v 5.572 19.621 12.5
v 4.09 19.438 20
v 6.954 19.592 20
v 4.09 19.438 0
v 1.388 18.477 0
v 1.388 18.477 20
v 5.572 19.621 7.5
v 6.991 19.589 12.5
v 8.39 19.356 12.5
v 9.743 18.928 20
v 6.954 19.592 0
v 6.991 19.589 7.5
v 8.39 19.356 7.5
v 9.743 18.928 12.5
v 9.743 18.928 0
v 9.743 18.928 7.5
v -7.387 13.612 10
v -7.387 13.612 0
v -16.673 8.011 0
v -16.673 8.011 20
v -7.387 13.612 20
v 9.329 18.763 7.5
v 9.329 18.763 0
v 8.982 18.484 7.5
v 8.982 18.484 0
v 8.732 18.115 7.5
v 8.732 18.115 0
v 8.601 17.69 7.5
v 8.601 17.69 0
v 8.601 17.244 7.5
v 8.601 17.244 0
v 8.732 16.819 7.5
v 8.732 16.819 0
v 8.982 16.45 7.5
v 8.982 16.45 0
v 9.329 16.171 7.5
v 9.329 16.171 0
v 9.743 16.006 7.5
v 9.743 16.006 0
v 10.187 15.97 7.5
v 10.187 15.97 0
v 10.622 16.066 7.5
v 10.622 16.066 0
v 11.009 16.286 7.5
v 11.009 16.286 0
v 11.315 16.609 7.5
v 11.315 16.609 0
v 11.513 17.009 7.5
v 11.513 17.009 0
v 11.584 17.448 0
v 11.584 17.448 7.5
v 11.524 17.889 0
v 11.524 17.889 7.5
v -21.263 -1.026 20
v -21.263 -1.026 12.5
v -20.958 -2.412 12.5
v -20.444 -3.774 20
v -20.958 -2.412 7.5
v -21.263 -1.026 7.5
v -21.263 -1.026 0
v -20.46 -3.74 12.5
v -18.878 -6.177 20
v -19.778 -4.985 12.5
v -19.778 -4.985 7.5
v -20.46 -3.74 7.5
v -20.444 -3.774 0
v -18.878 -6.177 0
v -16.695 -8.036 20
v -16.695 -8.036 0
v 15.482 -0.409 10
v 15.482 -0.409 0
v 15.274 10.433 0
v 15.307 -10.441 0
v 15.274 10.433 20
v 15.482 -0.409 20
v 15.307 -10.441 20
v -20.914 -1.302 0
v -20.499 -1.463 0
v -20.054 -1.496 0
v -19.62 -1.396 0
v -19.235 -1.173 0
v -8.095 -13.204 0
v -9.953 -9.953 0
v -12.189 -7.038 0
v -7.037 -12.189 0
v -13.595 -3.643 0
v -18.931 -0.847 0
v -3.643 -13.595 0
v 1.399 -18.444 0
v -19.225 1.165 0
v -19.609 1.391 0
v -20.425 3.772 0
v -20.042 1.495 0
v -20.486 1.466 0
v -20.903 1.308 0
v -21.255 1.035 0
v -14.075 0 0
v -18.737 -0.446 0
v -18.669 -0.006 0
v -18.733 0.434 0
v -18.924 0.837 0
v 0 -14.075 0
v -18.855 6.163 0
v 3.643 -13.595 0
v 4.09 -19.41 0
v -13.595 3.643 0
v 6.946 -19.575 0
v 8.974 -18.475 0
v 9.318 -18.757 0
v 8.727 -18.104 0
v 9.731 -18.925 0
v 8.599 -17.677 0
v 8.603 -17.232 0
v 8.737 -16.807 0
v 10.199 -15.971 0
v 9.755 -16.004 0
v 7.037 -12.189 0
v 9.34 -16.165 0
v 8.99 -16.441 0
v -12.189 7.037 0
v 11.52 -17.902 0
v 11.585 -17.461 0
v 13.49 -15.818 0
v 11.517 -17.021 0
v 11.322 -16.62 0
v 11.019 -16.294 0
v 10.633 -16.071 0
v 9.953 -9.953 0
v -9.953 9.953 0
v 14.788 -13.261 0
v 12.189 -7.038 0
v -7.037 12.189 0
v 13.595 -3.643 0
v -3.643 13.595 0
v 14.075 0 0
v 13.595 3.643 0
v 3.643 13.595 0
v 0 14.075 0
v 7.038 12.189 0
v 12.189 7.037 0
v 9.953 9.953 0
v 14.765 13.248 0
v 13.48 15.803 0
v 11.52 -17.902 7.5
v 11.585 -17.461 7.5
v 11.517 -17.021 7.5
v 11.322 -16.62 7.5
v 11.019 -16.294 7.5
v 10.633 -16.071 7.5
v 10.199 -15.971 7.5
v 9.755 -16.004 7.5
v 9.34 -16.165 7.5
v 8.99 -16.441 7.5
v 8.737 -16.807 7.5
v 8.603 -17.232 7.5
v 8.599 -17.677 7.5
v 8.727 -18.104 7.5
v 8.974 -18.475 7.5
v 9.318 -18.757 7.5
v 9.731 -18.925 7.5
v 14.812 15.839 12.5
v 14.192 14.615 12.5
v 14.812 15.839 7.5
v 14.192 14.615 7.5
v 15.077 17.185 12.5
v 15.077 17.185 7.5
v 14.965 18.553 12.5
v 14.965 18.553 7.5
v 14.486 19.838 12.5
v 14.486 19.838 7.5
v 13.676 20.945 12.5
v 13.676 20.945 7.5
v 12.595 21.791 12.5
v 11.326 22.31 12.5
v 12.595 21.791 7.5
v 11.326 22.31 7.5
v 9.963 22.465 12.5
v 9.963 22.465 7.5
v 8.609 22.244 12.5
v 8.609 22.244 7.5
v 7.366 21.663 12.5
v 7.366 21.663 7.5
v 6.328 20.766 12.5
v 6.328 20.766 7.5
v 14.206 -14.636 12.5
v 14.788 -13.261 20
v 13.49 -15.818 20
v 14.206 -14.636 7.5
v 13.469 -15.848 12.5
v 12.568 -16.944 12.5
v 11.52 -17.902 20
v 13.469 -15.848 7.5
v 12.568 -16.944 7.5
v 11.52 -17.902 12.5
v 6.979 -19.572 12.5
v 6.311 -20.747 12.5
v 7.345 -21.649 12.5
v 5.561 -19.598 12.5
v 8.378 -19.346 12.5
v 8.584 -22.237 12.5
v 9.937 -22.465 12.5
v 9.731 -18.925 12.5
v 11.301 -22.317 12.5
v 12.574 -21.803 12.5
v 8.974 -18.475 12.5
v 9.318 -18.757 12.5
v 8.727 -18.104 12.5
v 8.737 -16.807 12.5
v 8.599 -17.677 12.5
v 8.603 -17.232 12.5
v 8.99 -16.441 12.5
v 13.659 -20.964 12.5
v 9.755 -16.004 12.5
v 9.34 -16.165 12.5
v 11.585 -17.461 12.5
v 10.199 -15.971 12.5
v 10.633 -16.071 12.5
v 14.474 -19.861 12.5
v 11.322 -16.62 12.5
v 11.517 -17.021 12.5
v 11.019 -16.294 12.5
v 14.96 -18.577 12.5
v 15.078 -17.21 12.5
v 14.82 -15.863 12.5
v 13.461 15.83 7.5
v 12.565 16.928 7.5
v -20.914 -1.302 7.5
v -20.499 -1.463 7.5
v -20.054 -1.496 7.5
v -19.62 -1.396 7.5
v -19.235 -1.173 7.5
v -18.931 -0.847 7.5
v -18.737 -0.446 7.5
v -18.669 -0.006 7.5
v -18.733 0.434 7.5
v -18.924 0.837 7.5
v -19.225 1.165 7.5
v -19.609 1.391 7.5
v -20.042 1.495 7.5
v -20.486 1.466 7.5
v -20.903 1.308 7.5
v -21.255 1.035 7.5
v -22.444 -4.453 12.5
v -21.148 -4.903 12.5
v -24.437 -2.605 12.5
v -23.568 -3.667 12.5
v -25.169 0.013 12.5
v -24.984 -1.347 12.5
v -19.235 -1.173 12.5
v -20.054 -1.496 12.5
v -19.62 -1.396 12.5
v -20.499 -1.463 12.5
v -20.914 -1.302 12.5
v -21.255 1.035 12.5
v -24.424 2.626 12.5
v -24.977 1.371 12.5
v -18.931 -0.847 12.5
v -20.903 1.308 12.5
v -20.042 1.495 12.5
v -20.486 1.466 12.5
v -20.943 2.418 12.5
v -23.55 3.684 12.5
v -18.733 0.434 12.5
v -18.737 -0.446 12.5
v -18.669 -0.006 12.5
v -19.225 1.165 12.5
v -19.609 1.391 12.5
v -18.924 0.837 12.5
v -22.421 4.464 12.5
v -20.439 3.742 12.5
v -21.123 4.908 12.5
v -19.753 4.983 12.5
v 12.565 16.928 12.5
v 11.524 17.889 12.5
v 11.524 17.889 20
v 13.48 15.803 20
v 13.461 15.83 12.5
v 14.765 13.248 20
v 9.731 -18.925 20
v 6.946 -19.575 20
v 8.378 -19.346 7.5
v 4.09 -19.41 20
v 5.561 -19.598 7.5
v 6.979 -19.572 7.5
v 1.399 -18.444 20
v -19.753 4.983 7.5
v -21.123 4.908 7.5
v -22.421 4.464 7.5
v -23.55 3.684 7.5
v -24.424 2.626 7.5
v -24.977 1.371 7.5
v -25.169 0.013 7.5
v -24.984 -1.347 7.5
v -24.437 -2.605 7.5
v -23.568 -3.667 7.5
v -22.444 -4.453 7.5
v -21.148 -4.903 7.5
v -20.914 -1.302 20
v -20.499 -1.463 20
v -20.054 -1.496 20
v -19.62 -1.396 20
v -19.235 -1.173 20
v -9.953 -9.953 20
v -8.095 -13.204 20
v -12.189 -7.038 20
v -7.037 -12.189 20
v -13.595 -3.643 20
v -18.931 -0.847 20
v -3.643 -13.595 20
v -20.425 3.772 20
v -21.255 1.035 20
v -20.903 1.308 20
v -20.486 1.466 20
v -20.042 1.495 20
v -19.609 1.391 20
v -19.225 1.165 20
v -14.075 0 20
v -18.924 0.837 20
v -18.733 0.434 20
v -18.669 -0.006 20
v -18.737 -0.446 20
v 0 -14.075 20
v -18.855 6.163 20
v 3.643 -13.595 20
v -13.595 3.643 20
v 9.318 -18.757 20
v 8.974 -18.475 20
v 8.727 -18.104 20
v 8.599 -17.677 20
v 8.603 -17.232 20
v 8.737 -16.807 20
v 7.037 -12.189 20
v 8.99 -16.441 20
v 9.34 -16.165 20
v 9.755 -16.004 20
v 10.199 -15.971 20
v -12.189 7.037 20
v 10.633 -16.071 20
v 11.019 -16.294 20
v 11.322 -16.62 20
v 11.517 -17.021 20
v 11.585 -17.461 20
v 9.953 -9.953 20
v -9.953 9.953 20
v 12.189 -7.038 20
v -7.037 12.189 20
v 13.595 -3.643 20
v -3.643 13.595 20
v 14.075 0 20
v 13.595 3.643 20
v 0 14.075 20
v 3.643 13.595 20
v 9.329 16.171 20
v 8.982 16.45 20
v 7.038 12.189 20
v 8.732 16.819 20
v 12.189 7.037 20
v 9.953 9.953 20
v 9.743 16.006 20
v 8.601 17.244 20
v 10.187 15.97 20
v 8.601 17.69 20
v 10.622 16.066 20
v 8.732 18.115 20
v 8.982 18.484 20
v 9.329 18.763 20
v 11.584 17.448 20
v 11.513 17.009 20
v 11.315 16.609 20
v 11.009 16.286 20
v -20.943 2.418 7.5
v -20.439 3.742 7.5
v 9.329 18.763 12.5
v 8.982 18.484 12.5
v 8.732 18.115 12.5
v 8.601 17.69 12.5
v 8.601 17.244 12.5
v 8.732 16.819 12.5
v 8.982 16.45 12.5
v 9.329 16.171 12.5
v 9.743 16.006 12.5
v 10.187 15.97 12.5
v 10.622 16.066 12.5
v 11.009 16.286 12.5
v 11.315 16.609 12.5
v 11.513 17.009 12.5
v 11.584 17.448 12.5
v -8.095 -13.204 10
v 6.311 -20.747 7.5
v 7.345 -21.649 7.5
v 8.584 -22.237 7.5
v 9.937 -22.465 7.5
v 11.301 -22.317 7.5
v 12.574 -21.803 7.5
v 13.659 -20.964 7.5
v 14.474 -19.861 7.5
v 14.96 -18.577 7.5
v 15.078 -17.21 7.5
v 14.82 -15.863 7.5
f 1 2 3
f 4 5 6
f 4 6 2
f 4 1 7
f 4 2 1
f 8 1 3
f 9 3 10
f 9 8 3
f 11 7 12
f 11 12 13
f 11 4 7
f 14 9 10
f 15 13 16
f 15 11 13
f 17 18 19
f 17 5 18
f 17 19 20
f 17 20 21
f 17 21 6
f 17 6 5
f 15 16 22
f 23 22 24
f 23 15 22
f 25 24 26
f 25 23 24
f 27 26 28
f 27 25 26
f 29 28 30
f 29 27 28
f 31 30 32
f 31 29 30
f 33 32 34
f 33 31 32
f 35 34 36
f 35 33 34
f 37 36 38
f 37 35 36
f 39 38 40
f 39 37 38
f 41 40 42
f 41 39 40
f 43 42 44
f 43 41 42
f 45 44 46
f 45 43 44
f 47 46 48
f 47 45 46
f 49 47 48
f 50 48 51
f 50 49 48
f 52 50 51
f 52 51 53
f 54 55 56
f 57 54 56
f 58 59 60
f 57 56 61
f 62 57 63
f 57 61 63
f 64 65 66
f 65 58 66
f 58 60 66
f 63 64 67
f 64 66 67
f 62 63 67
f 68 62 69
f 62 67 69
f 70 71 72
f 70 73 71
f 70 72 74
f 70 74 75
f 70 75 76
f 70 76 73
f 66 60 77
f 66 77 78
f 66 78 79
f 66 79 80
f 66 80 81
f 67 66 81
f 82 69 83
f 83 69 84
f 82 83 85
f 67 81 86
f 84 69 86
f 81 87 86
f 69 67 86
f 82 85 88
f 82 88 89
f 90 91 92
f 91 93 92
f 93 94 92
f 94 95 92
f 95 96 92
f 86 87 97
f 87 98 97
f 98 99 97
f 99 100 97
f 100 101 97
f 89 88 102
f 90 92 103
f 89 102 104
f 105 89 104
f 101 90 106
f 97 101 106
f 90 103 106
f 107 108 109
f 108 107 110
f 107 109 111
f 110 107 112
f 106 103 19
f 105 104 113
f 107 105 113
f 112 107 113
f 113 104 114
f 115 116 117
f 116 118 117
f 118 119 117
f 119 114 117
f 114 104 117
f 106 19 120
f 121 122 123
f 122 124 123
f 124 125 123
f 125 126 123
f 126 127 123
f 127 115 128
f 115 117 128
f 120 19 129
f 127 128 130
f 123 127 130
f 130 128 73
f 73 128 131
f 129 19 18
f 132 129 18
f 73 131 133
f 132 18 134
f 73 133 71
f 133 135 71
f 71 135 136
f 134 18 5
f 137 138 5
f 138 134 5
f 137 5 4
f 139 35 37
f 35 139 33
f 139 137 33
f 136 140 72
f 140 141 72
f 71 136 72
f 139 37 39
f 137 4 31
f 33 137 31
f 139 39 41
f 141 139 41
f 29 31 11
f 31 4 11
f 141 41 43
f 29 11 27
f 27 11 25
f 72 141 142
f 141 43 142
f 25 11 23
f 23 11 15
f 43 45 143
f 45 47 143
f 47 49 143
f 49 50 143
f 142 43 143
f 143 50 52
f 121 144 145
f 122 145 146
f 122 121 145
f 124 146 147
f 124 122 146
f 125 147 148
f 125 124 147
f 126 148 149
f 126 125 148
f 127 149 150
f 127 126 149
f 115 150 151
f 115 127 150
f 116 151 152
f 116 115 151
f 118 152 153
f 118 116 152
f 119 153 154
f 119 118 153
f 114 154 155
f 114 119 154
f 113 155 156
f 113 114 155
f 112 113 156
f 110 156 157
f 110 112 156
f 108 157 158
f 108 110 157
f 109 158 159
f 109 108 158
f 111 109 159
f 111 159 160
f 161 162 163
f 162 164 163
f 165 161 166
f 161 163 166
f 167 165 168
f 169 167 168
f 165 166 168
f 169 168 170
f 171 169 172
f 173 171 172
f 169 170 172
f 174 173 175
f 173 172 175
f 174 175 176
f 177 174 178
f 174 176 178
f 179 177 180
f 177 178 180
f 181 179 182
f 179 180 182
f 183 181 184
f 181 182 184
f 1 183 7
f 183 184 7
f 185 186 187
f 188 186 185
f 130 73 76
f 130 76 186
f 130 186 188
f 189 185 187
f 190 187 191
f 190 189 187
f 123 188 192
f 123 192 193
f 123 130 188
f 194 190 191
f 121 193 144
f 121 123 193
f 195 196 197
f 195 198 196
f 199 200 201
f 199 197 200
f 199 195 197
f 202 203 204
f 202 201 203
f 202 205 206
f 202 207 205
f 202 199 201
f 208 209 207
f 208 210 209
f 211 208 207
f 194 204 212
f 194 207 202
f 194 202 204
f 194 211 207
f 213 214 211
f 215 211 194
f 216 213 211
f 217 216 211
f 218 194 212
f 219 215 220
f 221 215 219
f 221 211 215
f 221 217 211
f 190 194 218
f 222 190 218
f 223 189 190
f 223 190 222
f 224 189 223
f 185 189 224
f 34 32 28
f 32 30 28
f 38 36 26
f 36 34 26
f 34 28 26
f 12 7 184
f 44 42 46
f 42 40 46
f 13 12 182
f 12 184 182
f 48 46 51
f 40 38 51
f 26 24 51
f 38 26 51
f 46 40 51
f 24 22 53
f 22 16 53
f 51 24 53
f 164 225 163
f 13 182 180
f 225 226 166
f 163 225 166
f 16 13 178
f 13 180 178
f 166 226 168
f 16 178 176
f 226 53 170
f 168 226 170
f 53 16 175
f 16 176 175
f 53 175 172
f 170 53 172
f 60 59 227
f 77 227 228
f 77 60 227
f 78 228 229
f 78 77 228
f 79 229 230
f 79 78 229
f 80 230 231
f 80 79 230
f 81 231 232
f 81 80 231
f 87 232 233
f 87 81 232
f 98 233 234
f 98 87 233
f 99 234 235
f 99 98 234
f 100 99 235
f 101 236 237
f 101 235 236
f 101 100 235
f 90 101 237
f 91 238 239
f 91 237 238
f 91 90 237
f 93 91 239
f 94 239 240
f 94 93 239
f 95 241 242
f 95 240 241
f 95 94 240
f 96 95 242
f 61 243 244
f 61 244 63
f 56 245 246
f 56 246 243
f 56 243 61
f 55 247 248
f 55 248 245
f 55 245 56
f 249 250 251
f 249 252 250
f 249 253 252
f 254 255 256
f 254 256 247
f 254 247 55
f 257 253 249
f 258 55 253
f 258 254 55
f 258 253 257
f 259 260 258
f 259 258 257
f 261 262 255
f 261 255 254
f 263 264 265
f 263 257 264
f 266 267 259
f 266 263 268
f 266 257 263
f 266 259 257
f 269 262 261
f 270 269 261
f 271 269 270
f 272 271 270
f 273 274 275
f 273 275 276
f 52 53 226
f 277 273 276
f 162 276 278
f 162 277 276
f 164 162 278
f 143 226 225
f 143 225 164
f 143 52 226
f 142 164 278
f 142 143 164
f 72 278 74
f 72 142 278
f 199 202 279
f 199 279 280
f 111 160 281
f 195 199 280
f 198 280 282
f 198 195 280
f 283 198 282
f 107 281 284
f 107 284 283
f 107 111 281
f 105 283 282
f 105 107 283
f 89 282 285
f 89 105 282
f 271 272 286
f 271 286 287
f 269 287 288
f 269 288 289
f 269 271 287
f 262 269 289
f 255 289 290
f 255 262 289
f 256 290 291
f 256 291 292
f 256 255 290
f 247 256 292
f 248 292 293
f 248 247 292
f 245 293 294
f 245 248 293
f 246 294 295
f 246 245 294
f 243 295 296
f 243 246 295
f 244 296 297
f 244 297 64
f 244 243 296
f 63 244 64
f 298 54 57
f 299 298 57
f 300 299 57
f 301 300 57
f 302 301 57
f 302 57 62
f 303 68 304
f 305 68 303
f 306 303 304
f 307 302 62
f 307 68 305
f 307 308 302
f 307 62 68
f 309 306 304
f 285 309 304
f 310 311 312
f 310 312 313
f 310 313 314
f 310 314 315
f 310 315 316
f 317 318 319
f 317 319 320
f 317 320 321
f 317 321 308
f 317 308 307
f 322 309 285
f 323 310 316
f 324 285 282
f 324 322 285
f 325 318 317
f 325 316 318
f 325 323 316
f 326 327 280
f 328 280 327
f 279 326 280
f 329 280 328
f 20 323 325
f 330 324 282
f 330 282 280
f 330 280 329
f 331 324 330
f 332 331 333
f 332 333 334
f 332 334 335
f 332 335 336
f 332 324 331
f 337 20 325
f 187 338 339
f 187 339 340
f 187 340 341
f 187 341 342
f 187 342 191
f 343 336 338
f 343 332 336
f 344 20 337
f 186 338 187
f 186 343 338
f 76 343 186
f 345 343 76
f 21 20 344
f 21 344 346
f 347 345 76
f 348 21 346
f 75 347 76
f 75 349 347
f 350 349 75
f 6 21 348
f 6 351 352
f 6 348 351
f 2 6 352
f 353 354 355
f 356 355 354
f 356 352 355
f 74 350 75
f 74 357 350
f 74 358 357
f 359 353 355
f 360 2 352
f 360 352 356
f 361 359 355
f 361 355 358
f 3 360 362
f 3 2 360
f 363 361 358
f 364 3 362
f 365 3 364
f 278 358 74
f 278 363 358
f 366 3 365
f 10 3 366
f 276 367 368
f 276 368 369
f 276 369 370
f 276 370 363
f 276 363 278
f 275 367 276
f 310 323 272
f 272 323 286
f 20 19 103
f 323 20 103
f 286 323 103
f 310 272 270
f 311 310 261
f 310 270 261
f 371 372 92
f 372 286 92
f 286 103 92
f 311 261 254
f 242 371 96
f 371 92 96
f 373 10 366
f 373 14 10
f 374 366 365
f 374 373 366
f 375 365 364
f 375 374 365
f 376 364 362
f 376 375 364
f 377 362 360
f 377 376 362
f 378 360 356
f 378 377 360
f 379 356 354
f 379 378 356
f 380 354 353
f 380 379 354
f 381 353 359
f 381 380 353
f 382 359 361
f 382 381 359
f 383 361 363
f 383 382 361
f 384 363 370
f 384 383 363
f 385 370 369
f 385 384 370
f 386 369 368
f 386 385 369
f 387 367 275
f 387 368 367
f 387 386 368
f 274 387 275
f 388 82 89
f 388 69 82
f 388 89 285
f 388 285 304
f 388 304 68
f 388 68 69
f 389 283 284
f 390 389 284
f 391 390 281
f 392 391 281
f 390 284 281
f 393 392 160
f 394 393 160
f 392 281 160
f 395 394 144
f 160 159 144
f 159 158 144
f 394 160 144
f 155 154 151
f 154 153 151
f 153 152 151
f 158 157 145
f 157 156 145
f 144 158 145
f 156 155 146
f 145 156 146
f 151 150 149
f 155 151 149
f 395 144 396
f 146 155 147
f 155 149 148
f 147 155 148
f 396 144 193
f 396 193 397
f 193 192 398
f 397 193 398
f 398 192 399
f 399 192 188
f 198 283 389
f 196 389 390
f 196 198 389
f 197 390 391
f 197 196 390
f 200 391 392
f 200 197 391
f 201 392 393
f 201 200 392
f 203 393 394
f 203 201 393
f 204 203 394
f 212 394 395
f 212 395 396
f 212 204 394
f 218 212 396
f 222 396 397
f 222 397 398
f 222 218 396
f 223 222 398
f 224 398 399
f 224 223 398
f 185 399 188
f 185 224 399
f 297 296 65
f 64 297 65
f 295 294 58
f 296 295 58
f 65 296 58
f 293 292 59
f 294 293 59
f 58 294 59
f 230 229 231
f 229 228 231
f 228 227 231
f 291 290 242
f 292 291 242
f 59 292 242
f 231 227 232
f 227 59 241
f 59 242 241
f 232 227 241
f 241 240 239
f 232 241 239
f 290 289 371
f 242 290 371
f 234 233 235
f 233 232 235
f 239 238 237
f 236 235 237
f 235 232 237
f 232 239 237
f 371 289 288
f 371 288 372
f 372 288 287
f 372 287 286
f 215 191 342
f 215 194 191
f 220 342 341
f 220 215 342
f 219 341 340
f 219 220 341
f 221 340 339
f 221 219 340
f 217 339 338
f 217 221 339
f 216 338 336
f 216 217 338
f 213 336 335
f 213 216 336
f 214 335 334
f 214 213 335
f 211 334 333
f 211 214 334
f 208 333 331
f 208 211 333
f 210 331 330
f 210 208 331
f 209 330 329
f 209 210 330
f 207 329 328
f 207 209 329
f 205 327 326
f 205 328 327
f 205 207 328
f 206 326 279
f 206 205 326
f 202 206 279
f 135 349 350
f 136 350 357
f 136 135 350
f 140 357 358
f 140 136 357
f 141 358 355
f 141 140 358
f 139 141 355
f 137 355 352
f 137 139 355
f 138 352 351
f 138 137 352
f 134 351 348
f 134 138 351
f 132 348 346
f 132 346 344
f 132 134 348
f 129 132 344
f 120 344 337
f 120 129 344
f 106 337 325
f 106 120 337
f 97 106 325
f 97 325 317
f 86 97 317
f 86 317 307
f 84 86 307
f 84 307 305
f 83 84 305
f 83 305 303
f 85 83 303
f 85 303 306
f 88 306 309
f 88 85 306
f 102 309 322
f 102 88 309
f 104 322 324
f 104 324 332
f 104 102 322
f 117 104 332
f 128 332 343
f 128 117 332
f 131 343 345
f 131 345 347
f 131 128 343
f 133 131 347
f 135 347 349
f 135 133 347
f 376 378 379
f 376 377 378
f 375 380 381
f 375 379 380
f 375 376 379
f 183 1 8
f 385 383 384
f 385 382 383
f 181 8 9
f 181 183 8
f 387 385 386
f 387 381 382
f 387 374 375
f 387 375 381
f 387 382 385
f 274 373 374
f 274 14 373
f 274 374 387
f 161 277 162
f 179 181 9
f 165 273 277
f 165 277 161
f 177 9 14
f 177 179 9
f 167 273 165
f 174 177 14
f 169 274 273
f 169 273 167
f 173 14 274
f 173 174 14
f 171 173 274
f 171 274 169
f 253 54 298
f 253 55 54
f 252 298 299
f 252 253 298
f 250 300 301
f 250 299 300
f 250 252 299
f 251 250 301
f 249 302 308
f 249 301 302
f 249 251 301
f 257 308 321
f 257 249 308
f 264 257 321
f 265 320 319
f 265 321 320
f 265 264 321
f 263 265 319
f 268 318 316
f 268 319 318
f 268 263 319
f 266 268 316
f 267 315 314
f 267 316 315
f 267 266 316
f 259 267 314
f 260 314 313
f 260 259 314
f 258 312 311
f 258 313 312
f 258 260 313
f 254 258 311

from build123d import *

# Parameters (mm, degrees)
SKETCH1_R               = 14.075
BOSS_EXTRUDE1_DEPTH     = 20
FILLET2_R               = 10
CIRPATTERN2_DEPTH       = 20
CUT_EXTRUDE1_DEPTH      = 36.236736823
CUT_EXTRUDE1_DEPTH_BACK = 36.236736823
SKETCH2_R               = 1.5
SKETCH3_R               = 5
BOSS_EXTRUDE2_DEPTH     = 2.5


# Read off the part's stored shape, not the designer's step: CirPattern2
with BuildPart() as part:
    # Sketch1 → Boss-Extrude1 (new body)
    with BuildSketch(Plane.XY):
        with BuildLine():
            ThreePointArc((15.07572539, 15.156517087), (10.68875, 18.513458069), (5.588066136, 20.634219712))
            add(Edge.make_bspline(
                [(-20.663791525, 5.477702624), (-6.455161962, 14.620684981), (5.588066136, 20.634219712)],
                knots=[0, 0, 0, 1, 1, 1], degree=2))
            ThreePointArc((-20.663791525, 5.477702624), (-21.3775, 0), (-20.663791525, -5.477702624))
            add(Edge.make_bspline(
                [(5.588066136, -20.634219712), (-9.434303633, -12.900676735), (-20.663791525, -5.477702624)],
                knots=[0, 0, 0, 1, 1, 1], degree=2))
            ThreePointArc((5.588066136, -20.634219712), (10.68875, -18.513458069), (15.07572539, -15.156517087))
            add(Edge.make_bspline(
                [(15.07572539, 15.156517087), (15.889465595, -1.720008246), (15.07572539, -15.156517087)],
                knots=[0, 0, 0, 1, 1, 1], degree=2))
        make_face()
        Circle(SKETCH1_R, mode=Mode.SUBTRACT)
    extrude(amount=BOSS_EXTRUDE1_DEPTH)

    # Fillet2
    # the kernel refuses this fillet: 10 mm, written as the material it takes off along each edge
    with BuildSketch(Plane(origin=(-20.663791525, 5.477702624, 0), x_dir=(0.8442926206452175, 0.535882422480931, 0), z_dir=(0, 0, 1))) as fillet2_piece_1:
        with BuildLine():
            CenterArc((4.663228268, -9.99979423), FILLET2_R, 89.632438943, 60.311708344)
            Line((-3.992147587, -4.991354472), (-4.165255104, -4.891185677))
            ThreePointArc((-4.165255104, -4.891185677), (-2.339855889, -2.220716027), (-0.135758458, 0.146866065))
            Line((-0.135758458, 0.146866065), (-0.001245228, 0.199996123))
            ThreePointArc((-0.001245228, 0.199996123), (2.363679869, 0.207468059), (4.728662356, 0.199995885))
            Line((4.728662356, 0.199995885), (4.727379335, 0))
        make_face()
    extrude(amount=20, mode=Mode.SUBTRACT)
    with BuildSketch(Plane(origin=(-20.663791525, -5.477702624, 0), x_dir=(-0.11054249856240242, 0.9938713981253215, 0), z_dir=(0, 0, 1))) as fillet2_piece_2:
        with BuildLine():
            CenterArc((4.841664479, -9.890151004), FILLET2_R, 81.49970425, 59.972427812)
            Line((-2.981388332, -3.661198868), (-3.137849388, -3.536619825))
            ThreePointArc((-3.137849388, -3.536619825), (-1.656048683, -1.695980181), (-0.153629227, 0.128054913))
            Line((-0.153629227, 0.128054913), (-0.029562903, 0.19780302))
            ThreePointArc((-0.029562903, 0.19780302), (3.159904821, 0.434829692), (6.349372545, 0.19780302))
            Line((6.349372545, 0.19780302), (6.319809642, 0))
        make_face()
    extrude(amount=20, mode=Mode.SUBTRACT)

    # CirPattern2 outline → CirPattern2 (cut)
    with BuildSketch(Plane.XY):
        with BuildLine():
            add(Edge.make_bspline(
                [(5.588066136, 20.634219712), (3.520088132, 19.601618033), (1.388262549, 18.476743556)],
                knots=[0, 0, 0, 0.171712932, 0.171712932, 0.171712932], degree=2))
            ThreePointArc((1.388262549, 18.476743556), (6.013402902, 19.632371585), (10.648001522, 18.515279353))
            ThreePointArc((10.648001522, 18.515279353), (13.959170177, 15.045625026), (15.27399868, 10.43329752))
            add(Edge.make_bspline(
                [(15.27399868, 10.43329752), (15.191267831, 12.760230261), (15.07572539, 15.156517087)],
                knots=[0.858010652, 0.858010652, 0.858010652, 1, 1, 1], degree=2))
            ThreePointArc((15.07572539, 15.156517087), (10.68875, 18.513458069), (5.588066136, 20.634219712))
        make_face()
        with BuildLine():
            add(Edge.make_bspline(
                [(15.07572539, -15.156517087), (15.215455106, -12.849294762), (15.307198024, -10.440642412)],
                knots=[0, 0, 0, 0.171712932, 0.171712932, 0.171712932], degree=2))
            ThreePointArc((15.307198024, -10.440642412), (13.995431078, -15.023945468), (10.710701517, -18.479079494))
            ThreePointArc((10.710701517, -18.479079494), (6.0503084, -19.611808503), (1.398501358, -18.444319635))
            add(Edge.make_bspline(
                [(1.398501358, -18.444319635), (3.455049649, -19.536138988), (5.588066136, -20.634219712)],
                knots=[0.858010652, 0.858010652, 0.858010652, 1, 1, 1], degree=2))
            ThreePointArc((5.588066136, -20.634219712), (10.68875, -18.513458069), (15.07572539, -15.156517087))
        make_face()
    extrude(amount=CIRPATTERN2_DEPTH, mode=Mode.SUBTRACT)

    # Sketch2 → Cut-Extrude1 (cut, two sides: drawn at the far end of the back side and taken through both)
    with BuildSketch(Plane.XY.offset(20).offset(-CUT_EXTRUDE1_DEPTH_BACK)):
        with Locations((10.084522584, -17.466905485)):
            Circle(SKETCH2_R)
        with Locations((10.084522584, 17.466905485)):
            Circle(SKETCH2_R)
        with Locations((-20.169045167, 0)):
            Circle(SKETCH2_R)
    extrude(amount=CUT_EXTRUDE1_DEPTH + CUT_EXTRUDE1_DEPTH_BACK, mode=Mode.SUBTRACT)

    # Sketch3 → Boss-Extrude2 (add, symmetric)
    with BuildSketch(Plane.XY.offset(10)):
        with Locations((-20.169045167, 0)):
            Circle(SKETCH3_R)
        with Locations((10.084522584, 17.466905485)):
            Circle(SKETCH3_R)
        with Locations((10.084522584, -17.466905485)):
            Circle(SKETCH3_R)
    extrude(amount=BOSS_EXTRUDE2_DEPTH, both=True)


solid = part.part
